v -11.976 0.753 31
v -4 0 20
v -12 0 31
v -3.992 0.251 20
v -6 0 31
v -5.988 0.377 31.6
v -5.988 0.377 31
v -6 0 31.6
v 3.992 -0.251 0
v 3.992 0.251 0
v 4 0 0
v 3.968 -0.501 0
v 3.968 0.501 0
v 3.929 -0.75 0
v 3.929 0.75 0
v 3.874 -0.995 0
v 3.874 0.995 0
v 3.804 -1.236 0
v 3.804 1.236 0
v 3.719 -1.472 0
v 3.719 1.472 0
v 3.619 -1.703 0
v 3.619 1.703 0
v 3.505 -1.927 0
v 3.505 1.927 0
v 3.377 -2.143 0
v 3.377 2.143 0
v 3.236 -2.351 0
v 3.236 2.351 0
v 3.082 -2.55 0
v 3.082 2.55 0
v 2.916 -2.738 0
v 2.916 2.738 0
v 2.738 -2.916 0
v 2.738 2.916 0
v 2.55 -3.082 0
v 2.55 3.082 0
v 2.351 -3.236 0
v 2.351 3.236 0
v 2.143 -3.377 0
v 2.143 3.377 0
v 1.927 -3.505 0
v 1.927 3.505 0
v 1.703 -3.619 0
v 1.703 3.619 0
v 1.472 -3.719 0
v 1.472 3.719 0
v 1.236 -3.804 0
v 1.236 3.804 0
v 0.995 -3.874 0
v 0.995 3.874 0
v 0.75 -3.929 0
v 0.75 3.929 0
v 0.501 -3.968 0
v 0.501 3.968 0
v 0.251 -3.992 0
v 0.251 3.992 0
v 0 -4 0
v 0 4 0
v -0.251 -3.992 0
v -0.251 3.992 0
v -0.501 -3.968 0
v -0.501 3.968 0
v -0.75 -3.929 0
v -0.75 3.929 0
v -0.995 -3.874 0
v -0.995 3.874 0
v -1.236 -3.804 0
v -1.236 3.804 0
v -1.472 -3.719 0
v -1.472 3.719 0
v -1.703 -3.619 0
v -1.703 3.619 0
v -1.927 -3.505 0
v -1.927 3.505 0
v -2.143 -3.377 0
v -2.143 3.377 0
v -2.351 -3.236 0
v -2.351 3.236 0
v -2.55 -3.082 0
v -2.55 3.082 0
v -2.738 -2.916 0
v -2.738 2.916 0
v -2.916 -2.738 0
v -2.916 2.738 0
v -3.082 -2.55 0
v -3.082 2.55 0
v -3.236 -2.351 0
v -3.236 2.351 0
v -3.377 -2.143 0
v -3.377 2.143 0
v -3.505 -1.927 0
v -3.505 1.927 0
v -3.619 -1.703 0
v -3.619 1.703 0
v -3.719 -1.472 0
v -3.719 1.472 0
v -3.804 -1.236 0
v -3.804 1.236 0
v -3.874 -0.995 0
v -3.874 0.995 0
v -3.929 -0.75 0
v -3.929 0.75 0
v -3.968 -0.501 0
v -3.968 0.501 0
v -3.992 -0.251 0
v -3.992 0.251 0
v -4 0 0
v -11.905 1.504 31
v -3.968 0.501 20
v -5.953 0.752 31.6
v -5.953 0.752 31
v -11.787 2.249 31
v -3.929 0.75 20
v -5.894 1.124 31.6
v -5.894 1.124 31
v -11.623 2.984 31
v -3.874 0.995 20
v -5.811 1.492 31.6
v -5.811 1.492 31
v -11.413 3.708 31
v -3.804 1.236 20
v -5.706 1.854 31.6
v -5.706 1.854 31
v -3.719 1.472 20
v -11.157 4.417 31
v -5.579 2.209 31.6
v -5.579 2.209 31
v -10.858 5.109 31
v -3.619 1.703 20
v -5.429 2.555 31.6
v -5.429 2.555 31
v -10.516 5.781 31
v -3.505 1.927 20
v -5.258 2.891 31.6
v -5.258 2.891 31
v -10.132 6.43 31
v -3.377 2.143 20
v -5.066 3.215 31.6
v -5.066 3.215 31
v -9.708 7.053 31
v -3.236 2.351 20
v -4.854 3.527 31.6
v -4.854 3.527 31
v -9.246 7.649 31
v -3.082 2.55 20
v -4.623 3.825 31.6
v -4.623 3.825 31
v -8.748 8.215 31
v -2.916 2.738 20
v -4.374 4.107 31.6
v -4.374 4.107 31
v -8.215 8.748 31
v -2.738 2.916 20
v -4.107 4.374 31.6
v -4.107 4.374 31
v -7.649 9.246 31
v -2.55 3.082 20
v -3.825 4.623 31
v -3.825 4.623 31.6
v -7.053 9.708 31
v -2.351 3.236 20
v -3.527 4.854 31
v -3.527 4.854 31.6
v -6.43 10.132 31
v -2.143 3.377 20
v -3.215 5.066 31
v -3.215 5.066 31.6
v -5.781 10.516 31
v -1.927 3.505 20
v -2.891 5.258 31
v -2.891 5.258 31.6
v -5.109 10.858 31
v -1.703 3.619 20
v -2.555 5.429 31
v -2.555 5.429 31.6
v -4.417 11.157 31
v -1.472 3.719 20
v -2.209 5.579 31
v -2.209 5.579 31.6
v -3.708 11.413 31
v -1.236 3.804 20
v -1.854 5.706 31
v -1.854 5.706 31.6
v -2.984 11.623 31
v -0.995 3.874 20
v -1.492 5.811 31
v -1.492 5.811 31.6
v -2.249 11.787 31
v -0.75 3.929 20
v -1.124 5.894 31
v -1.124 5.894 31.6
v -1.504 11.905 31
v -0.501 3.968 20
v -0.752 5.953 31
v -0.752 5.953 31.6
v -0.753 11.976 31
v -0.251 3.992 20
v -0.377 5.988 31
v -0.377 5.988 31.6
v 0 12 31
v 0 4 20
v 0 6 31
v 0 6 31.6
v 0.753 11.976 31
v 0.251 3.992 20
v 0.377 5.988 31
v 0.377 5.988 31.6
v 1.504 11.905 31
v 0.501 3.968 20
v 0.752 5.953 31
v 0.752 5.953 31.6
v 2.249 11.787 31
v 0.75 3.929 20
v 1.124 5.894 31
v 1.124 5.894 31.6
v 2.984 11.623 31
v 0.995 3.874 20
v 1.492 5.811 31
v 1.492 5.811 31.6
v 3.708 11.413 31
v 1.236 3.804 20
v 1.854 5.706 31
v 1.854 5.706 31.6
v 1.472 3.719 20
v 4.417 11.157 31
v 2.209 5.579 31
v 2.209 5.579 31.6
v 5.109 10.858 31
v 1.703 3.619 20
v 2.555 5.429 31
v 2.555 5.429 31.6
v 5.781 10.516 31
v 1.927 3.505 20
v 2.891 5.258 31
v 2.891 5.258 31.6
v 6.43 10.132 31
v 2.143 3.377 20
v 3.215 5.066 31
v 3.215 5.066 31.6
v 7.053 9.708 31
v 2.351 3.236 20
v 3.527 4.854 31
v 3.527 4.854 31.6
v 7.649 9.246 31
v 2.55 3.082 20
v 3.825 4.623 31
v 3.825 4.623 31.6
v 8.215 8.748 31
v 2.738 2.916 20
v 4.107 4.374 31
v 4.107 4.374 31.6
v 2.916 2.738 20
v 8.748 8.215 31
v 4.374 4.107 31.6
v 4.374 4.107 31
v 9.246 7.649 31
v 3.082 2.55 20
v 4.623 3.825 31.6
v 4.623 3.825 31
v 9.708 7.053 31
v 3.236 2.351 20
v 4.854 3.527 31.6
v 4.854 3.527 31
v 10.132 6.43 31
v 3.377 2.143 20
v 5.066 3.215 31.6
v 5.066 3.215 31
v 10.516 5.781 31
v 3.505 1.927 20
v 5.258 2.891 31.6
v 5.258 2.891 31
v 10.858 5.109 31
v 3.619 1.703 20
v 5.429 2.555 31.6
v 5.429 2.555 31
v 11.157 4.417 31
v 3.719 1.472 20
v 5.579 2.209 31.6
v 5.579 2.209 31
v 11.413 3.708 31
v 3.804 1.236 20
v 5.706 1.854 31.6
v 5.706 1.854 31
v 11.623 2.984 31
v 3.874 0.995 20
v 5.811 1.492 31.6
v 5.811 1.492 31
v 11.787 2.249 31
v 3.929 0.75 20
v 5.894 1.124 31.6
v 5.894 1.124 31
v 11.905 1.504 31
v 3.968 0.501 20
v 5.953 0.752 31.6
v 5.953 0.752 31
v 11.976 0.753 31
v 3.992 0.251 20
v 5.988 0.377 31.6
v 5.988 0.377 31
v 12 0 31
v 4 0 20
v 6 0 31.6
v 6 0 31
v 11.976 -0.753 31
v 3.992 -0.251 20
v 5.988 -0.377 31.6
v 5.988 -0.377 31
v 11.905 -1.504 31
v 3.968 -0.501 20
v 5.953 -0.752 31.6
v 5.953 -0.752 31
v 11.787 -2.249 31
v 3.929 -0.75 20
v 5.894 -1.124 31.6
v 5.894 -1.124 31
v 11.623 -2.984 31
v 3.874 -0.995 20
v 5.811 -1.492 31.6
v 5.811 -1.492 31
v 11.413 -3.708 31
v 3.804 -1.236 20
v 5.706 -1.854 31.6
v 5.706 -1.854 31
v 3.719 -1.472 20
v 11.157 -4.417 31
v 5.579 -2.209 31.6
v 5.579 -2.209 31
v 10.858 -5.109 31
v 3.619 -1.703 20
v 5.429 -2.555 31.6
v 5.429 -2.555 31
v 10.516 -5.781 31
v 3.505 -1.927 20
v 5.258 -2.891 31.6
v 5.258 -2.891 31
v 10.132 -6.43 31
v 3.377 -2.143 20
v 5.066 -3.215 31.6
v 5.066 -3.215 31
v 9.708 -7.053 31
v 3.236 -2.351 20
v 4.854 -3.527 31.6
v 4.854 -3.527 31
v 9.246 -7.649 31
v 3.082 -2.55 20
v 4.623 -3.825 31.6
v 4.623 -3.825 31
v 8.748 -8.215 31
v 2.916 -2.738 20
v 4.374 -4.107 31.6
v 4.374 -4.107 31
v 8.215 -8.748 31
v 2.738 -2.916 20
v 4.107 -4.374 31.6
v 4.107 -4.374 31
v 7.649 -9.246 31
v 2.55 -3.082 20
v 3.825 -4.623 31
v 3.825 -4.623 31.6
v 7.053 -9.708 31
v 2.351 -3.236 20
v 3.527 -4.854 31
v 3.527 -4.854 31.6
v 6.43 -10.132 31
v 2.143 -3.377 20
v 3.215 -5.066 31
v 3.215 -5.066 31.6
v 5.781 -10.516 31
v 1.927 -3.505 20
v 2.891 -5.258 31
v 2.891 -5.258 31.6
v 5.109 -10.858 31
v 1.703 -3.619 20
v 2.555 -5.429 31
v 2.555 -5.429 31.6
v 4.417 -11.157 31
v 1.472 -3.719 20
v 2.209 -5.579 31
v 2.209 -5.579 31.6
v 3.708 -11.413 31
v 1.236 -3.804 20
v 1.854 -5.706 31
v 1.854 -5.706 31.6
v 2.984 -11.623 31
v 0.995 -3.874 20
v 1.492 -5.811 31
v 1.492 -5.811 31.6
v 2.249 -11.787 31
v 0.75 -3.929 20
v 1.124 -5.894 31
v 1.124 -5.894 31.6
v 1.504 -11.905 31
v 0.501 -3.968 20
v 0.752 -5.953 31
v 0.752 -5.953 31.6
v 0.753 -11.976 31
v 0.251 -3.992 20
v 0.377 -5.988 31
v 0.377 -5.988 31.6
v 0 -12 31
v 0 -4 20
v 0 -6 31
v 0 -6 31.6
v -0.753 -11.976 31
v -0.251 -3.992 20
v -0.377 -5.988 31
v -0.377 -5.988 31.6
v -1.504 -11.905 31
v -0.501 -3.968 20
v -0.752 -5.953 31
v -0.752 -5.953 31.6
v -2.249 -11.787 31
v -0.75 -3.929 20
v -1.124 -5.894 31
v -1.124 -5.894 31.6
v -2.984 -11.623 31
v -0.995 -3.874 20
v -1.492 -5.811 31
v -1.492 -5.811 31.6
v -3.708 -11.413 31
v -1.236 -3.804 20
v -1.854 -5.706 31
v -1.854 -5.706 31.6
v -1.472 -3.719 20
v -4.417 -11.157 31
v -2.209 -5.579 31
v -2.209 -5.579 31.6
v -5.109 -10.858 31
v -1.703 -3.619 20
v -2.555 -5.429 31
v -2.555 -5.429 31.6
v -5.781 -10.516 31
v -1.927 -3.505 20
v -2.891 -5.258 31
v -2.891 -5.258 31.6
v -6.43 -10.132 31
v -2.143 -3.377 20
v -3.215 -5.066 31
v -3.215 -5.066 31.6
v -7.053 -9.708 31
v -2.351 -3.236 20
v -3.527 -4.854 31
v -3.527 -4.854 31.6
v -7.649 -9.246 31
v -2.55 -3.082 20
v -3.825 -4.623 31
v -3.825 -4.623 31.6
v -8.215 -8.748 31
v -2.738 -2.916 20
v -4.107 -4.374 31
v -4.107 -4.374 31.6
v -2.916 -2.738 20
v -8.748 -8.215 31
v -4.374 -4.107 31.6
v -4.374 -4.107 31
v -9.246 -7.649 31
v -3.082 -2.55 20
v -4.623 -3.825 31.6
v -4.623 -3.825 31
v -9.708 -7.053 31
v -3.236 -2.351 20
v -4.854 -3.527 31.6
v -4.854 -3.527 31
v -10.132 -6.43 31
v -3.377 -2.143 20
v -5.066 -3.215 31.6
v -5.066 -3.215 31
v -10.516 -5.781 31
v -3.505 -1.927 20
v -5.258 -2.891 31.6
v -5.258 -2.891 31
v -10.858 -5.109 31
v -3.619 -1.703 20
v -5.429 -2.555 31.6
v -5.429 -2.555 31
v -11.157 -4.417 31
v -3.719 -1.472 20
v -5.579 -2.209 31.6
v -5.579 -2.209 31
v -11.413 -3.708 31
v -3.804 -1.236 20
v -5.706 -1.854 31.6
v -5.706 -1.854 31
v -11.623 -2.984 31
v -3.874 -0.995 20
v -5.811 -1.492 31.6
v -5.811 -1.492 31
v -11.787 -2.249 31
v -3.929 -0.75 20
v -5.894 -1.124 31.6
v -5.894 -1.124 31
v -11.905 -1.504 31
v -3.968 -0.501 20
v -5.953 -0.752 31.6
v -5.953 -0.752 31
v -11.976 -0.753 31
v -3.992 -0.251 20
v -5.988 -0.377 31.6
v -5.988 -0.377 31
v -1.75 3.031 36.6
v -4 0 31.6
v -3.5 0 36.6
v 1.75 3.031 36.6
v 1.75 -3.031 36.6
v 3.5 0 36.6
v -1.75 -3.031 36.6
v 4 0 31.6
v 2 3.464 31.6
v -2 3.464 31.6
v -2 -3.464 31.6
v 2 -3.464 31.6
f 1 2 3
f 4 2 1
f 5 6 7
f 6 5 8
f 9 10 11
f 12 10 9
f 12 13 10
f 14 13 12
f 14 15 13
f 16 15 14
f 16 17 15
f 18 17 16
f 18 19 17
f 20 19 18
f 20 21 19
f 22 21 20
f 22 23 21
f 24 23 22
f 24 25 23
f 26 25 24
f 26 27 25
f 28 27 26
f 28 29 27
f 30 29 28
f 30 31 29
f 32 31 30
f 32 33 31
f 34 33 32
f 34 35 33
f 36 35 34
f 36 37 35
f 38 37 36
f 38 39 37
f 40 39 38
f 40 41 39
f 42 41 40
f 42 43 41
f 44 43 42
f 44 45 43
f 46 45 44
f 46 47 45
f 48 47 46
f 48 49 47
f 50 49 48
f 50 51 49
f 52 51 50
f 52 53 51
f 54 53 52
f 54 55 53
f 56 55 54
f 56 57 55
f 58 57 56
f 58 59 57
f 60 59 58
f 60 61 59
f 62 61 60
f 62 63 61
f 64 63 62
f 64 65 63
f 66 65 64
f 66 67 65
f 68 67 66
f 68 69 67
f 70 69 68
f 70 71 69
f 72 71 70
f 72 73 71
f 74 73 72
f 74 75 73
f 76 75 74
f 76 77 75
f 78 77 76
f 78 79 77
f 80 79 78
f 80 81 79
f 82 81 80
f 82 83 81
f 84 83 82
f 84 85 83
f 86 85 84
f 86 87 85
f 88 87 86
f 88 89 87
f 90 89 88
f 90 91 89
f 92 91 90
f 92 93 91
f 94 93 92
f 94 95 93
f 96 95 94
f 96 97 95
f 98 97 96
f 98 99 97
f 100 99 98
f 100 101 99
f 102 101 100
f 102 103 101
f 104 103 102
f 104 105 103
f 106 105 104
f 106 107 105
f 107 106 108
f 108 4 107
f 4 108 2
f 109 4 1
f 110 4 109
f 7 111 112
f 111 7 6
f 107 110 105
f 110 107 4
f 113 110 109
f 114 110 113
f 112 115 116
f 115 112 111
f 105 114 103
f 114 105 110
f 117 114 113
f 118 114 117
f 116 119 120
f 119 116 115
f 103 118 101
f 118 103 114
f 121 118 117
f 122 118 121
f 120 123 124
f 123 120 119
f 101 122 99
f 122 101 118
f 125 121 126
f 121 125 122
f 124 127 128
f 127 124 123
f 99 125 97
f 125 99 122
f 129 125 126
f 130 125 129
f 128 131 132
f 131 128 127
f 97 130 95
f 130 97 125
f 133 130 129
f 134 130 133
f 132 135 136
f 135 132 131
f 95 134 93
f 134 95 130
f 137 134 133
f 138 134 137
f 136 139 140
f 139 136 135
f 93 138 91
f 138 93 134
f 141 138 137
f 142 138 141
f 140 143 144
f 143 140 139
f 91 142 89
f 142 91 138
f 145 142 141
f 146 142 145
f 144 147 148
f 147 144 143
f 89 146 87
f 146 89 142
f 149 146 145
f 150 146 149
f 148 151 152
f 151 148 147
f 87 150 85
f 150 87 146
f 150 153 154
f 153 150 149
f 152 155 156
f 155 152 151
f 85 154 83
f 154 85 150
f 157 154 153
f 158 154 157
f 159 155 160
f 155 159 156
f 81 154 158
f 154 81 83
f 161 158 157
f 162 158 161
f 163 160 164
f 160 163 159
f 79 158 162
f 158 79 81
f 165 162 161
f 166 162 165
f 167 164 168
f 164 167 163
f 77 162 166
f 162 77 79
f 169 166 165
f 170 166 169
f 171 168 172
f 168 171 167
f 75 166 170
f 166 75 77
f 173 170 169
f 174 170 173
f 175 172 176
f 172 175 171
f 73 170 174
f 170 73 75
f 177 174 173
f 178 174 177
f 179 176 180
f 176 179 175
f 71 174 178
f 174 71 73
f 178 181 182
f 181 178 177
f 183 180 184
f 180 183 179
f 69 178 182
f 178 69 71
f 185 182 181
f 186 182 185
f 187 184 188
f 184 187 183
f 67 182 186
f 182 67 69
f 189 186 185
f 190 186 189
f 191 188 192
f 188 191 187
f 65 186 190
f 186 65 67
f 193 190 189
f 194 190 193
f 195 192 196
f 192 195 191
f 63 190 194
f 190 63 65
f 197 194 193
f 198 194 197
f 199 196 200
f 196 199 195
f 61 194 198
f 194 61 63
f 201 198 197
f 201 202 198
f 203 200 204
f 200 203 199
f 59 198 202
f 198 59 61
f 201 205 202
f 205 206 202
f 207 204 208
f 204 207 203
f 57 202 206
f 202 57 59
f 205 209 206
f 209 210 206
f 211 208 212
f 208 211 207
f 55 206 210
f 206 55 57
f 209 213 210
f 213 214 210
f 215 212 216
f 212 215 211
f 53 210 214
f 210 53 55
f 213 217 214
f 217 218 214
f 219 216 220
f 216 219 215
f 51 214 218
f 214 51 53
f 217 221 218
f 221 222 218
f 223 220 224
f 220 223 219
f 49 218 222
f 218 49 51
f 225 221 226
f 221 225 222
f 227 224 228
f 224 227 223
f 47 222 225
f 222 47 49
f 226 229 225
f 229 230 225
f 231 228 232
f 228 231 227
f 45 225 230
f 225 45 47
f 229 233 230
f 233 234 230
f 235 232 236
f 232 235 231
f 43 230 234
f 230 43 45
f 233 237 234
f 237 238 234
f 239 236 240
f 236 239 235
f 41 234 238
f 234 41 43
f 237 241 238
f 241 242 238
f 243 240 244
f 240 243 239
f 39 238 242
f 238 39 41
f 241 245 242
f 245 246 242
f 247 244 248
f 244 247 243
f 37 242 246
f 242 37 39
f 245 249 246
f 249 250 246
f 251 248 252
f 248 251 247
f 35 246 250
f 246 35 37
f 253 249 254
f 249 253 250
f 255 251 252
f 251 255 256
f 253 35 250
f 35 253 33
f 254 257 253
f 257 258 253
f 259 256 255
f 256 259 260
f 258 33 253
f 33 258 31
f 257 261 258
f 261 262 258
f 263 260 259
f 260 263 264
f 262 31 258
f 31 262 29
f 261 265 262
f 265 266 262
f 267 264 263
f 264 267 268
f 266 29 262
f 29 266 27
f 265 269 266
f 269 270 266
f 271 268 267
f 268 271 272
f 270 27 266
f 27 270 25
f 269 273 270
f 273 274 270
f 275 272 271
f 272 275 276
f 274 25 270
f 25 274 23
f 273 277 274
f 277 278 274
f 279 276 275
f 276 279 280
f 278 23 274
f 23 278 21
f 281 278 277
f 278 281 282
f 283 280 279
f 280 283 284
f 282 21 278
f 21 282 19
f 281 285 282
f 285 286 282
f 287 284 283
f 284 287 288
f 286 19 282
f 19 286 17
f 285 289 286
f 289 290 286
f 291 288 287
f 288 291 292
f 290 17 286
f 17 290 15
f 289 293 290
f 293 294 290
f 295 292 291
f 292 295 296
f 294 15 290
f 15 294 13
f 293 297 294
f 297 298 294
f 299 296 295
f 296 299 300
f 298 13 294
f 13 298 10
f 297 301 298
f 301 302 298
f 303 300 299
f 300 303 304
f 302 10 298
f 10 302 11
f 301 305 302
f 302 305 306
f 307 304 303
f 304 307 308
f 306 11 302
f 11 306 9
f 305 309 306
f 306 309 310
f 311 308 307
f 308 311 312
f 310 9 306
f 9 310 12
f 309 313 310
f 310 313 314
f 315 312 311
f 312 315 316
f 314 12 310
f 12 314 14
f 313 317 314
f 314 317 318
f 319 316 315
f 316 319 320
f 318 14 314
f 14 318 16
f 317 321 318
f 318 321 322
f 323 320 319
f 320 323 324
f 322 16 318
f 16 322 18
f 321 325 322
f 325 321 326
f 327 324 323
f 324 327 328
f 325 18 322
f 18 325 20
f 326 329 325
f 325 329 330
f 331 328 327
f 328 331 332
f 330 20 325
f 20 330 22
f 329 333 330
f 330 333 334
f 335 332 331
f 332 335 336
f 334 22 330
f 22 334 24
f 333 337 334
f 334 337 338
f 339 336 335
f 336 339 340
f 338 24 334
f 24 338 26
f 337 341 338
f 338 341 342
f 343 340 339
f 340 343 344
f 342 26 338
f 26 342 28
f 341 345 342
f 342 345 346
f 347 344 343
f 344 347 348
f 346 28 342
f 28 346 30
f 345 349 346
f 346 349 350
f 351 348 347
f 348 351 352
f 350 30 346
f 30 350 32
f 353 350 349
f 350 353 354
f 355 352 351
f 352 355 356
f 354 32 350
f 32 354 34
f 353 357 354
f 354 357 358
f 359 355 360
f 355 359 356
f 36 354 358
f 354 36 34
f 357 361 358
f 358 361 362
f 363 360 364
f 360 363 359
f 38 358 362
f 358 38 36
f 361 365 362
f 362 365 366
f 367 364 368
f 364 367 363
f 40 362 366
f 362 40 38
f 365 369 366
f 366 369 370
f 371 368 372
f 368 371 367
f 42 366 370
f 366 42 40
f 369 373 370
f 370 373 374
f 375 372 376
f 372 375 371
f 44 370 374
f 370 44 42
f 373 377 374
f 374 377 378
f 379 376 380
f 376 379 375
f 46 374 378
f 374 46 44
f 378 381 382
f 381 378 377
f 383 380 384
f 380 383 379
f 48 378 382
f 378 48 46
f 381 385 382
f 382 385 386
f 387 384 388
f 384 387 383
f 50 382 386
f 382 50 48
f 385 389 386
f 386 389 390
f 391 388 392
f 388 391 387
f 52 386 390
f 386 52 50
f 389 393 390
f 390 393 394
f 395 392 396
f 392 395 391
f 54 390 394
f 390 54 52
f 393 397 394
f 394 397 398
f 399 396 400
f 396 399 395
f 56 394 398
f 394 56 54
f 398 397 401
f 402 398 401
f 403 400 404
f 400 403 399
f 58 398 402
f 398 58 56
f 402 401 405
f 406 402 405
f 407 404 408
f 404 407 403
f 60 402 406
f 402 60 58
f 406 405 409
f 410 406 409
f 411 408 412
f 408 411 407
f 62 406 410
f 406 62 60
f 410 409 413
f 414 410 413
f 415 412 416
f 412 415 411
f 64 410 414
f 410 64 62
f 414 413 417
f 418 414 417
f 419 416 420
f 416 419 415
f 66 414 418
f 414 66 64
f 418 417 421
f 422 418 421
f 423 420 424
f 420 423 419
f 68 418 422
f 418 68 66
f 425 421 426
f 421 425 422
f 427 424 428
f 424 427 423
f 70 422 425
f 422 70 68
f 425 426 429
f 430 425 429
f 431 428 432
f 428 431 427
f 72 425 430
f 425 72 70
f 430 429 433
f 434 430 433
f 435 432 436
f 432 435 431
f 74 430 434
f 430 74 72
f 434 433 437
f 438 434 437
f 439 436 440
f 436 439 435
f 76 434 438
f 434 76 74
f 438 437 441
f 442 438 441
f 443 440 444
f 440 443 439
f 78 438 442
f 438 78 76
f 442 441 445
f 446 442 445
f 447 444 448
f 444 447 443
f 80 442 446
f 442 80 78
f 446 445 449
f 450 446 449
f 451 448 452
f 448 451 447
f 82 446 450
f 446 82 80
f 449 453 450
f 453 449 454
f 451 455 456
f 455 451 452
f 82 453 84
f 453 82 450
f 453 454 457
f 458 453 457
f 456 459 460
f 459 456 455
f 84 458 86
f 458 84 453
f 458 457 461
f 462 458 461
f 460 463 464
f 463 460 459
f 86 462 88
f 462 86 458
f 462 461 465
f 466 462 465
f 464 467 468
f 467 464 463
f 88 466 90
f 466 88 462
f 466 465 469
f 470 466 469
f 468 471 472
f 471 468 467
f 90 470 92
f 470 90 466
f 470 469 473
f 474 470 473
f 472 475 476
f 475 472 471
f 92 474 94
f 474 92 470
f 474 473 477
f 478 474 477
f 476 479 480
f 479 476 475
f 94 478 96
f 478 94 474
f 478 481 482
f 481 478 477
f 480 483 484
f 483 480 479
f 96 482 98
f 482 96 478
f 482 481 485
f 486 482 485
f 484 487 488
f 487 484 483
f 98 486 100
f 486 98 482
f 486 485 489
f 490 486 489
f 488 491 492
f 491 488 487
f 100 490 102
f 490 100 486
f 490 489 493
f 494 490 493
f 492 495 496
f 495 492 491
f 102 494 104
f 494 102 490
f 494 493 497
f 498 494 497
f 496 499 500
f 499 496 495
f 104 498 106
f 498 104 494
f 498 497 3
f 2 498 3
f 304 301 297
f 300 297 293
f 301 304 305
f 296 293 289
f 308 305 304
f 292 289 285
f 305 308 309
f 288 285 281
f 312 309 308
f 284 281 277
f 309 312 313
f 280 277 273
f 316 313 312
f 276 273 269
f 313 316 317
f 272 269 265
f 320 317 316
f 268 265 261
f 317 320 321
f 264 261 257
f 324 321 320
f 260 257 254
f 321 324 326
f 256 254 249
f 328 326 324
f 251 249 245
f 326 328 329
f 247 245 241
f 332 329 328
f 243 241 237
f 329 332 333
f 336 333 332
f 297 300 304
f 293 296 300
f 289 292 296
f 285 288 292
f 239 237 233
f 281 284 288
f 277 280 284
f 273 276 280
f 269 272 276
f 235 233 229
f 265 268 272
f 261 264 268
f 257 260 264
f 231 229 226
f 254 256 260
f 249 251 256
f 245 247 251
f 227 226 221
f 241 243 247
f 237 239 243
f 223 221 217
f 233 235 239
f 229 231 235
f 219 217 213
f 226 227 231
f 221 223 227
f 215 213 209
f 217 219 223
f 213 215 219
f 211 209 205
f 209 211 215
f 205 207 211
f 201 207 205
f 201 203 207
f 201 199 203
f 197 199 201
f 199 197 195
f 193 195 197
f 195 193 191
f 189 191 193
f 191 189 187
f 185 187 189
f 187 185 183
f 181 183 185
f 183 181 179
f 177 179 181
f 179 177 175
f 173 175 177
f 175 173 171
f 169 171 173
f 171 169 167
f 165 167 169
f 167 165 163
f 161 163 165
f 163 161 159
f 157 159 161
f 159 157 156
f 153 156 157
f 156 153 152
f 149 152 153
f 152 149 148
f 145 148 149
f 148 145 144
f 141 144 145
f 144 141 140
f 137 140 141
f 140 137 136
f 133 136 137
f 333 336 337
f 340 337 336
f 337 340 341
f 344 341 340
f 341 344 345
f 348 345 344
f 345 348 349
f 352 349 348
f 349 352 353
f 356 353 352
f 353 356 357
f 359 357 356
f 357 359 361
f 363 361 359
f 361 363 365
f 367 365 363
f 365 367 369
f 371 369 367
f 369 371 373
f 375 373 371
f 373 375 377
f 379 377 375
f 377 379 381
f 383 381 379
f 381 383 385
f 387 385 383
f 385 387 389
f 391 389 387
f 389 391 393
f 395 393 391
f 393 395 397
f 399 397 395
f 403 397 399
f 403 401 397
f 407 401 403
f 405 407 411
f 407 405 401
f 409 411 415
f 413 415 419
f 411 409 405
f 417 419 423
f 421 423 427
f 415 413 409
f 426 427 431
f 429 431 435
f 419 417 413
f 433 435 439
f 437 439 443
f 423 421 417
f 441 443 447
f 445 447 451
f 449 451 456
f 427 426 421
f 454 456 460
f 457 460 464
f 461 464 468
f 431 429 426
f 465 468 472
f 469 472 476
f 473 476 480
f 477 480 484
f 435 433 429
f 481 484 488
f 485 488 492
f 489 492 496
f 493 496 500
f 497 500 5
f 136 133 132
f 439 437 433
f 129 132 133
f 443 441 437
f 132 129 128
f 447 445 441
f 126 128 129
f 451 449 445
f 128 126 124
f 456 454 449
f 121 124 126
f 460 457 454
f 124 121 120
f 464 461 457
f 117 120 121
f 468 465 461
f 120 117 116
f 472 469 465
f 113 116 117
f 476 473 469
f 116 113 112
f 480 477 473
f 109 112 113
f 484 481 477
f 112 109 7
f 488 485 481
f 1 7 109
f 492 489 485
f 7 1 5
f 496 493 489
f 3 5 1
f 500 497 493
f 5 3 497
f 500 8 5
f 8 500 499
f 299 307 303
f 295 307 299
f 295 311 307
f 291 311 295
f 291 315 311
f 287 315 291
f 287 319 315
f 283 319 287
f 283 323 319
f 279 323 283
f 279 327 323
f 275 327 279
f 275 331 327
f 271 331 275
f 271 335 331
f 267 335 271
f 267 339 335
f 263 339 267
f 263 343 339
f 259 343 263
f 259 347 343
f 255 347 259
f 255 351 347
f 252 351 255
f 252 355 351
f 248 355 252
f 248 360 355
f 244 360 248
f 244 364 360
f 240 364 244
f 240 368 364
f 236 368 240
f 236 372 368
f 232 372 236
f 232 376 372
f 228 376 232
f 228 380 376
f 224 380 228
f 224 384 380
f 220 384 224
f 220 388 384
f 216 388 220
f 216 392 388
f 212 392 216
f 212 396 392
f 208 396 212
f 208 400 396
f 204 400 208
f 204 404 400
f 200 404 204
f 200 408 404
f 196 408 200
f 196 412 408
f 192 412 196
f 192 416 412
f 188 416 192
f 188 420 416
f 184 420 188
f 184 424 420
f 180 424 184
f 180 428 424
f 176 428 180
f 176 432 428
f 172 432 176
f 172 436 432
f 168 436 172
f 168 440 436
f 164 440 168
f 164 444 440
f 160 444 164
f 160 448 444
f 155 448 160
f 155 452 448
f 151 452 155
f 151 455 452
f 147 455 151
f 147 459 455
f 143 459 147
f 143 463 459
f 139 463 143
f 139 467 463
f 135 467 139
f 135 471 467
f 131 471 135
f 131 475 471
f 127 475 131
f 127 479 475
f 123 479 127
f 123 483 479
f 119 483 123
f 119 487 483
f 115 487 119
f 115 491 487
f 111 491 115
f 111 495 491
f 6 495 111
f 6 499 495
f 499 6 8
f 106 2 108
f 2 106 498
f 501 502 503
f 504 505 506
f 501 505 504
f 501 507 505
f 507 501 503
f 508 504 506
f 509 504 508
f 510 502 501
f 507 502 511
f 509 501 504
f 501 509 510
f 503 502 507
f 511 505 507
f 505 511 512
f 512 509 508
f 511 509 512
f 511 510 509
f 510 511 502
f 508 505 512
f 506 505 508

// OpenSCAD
$fn=100;
rotate_extrude () {
    polygon (points = [[0,0], [4,0], [4,20], [12,31],[6,31],[6,31.6],[0,31.6]]);
}
translate ([0,0,31.6]) cylinder (h=5, r1=4, r2=3.5, $fn=6);
